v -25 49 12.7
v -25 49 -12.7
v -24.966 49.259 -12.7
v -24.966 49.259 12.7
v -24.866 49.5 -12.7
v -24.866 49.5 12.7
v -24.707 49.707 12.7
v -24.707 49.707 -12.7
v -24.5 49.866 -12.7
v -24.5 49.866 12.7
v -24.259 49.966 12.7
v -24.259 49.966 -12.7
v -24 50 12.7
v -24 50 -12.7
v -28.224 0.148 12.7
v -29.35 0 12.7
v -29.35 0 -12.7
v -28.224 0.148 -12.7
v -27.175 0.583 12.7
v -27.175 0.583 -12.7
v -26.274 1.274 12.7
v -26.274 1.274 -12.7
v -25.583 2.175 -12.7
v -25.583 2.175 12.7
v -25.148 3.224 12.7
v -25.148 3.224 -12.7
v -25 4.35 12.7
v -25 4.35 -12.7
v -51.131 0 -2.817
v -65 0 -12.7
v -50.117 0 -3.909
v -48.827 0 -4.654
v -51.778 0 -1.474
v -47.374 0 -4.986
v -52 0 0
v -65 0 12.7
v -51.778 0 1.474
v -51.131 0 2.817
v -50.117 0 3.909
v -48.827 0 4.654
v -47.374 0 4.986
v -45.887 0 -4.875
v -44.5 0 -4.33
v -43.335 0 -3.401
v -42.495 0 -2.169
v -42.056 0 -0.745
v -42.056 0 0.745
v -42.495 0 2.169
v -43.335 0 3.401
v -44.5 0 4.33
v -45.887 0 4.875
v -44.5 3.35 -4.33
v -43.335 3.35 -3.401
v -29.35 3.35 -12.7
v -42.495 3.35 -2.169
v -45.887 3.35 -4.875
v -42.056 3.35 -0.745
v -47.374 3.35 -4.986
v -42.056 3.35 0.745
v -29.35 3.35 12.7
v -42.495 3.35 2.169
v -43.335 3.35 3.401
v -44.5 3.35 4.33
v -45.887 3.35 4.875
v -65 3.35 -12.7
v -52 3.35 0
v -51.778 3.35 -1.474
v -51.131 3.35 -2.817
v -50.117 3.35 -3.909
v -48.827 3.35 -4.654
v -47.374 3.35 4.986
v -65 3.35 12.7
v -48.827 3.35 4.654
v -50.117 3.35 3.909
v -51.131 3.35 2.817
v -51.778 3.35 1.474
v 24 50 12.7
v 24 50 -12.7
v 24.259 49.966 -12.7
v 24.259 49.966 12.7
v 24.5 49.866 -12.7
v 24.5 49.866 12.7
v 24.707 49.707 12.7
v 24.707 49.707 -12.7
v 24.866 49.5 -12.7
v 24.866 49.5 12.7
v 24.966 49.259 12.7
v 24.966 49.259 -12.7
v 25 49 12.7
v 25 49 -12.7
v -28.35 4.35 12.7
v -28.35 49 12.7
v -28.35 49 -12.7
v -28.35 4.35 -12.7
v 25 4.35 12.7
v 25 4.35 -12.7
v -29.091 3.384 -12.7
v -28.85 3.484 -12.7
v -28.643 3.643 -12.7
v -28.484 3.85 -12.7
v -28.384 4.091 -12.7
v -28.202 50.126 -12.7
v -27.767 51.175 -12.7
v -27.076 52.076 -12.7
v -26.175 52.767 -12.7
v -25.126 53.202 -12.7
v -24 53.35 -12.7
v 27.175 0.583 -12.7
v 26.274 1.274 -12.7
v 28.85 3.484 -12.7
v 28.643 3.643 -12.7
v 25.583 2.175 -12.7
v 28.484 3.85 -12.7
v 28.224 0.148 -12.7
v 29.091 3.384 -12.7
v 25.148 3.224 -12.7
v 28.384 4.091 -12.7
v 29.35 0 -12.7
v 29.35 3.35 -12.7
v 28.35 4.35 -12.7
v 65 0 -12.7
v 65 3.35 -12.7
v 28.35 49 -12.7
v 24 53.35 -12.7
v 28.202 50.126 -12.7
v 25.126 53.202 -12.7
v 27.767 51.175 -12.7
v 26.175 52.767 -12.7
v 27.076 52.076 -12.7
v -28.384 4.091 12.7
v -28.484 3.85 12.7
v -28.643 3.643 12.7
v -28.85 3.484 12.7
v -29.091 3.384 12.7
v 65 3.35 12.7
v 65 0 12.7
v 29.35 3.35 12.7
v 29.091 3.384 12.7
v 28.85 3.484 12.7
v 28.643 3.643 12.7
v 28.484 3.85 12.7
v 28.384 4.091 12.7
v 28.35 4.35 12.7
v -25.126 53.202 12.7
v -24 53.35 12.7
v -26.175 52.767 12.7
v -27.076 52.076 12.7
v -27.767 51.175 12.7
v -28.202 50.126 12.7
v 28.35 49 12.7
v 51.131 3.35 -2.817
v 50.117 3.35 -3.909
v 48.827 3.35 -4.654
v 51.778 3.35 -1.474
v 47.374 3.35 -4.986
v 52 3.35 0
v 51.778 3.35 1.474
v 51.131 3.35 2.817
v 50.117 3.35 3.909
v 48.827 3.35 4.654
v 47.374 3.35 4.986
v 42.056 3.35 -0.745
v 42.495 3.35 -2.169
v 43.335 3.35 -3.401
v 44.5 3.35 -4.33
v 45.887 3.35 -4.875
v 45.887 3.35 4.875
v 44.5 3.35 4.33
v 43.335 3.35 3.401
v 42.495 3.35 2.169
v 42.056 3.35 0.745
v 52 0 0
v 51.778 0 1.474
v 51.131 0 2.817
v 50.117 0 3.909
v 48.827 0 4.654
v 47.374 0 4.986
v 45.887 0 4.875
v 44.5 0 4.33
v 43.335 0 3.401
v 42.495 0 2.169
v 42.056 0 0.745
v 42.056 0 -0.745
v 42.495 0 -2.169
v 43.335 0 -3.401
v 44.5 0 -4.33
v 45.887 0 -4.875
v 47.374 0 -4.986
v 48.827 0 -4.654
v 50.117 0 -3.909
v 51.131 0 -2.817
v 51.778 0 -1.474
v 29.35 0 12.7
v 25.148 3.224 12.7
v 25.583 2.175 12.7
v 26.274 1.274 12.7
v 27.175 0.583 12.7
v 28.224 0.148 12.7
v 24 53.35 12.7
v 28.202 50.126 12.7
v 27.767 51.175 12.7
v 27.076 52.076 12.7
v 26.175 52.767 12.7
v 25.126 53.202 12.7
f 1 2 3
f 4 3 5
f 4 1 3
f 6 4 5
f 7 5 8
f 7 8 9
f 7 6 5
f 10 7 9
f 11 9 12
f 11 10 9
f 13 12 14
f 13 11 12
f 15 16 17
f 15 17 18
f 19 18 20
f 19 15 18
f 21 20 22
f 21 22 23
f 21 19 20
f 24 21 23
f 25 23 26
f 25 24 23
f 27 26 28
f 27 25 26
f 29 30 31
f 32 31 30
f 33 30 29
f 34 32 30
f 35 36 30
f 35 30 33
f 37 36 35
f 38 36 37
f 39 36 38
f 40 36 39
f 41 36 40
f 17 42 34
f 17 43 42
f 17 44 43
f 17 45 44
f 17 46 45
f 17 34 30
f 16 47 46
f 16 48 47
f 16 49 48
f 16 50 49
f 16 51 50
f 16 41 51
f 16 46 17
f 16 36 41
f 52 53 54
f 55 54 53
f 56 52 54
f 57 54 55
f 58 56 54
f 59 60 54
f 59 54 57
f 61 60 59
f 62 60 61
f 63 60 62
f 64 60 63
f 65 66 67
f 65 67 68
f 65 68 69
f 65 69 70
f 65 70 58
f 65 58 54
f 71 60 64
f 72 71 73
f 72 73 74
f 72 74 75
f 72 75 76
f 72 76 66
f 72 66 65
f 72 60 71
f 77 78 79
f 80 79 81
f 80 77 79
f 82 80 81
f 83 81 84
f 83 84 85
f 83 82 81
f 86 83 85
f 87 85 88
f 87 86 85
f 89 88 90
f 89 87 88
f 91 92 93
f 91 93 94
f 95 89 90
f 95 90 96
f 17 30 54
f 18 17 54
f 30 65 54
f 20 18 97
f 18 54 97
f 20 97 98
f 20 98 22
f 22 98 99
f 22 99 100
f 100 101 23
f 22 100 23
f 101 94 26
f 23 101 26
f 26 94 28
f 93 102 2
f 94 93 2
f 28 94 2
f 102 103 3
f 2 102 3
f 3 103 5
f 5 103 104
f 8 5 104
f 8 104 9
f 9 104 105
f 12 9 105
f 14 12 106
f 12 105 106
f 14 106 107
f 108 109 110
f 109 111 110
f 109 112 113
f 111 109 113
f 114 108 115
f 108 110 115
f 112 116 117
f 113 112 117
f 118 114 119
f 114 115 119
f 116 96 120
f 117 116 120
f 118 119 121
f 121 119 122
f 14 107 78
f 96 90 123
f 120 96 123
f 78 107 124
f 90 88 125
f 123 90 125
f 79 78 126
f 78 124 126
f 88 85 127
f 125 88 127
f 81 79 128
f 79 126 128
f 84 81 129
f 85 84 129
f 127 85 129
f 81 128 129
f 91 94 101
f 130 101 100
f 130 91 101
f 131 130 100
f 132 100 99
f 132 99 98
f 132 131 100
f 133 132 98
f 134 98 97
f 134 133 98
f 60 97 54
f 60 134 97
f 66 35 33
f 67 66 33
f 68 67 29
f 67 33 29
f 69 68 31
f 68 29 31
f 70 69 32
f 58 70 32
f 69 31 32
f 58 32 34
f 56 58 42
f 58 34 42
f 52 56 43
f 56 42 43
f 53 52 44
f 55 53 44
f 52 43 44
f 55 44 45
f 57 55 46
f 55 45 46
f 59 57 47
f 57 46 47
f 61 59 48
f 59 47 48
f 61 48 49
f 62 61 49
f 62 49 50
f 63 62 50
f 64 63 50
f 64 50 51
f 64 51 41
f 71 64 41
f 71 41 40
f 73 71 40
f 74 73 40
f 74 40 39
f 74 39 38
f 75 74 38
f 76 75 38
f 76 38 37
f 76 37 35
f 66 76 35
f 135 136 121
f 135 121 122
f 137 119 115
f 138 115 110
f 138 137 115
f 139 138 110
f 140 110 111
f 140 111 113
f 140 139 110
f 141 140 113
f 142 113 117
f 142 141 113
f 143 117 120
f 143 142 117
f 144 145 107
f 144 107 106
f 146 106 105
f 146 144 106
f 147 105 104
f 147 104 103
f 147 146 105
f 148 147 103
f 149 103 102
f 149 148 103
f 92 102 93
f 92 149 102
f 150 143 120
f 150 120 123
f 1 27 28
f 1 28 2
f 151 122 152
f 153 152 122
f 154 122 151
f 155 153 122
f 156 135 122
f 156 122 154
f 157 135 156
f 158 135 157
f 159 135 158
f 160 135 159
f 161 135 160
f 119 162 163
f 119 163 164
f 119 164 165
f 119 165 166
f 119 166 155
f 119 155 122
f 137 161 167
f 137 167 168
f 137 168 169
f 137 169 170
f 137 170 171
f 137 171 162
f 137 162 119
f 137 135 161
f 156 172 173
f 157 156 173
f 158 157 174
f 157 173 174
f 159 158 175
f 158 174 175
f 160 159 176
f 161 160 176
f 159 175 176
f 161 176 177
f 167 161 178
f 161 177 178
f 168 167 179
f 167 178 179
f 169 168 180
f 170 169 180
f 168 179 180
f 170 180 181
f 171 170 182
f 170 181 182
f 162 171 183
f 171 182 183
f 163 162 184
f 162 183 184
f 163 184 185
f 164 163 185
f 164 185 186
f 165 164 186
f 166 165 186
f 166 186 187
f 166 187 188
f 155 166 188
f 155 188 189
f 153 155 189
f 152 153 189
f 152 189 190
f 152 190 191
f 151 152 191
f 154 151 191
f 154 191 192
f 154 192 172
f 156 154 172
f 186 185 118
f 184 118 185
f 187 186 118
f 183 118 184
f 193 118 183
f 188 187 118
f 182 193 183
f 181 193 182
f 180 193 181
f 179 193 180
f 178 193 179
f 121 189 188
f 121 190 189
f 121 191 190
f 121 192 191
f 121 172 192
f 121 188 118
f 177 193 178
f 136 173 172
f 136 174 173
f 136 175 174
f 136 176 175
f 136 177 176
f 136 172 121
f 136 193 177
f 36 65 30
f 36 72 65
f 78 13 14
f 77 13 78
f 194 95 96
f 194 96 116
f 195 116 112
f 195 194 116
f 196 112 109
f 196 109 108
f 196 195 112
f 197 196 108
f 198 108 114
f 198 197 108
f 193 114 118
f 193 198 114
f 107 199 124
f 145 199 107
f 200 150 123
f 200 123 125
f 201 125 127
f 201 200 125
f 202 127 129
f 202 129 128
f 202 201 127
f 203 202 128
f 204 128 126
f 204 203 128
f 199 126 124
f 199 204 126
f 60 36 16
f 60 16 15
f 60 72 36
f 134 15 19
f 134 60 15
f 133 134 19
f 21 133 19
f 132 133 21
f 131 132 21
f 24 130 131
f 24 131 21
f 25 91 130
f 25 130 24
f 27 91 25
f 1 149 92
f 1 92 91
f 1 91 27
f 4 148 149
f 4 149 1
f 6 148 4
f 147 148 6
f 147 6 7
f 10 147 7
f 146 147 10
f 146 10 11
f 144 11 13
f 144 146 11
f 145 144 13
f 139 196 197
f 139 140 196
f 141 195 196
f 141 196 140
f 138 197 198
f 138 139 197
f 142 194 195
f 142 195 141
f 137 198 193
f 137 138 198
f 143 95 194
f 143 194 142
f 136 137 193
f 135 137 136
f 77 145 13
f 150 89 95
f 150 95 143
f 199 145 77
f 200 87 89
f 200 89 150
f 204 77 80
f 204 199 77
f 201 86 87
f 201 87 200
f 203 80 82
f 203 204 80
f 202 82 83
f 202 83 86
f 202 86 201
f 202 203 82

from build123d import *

# Parameters (mm, degrees)
FLANGE_BASE1_DEPTH    = 12.7
ESBO_O3_R             = 5
CORTE_EXTRUS_O1_DEPTH = 10


# Sheet-metal steps are written as plain solids
with BuildPart() as part:
    # Esboço1 → Flange-base1 (new, symmetric)
    with BuildSketch(Plane.XY):
        with BuildLine():
            Line((-65, 0), (-29.35, 0))
            ThreePointArc((-29.35, 0), (-26.274085502, 1.274085502), (-25, 4.35))
            Line((-25, 4.35), (-25, 49))
            ThreePointArc((-25, 49), (-24.707106781, 49.707106781), (-24, 50))
            Line((-24, 50), (24, 50))
            ThreePointArc((24, 50), (24.707106781, 49.707106781), (25, 49))
            Line((25, 49), (25, 4.35))
            ThreePointArc((25, 4.35), (26.274085502, 1.274085502), (29.35, 0))
            Line((29.35, 0), (65, 0))
            Line((65, 0), (65, 3.35))
            Line((65, 3.35), (29.35, 3.35))
            ThreePointArc((29.35, 3.35), (28.642893219, 3.642893219), (28.35, 4.35))
            Line((28.35, 4.35), (28.35, 49))
            ThreePointArc((28.35, 49), (27.075914498, 52.075914498), (24, 53.35))
            Line((24, 53.35), (-24, 53.35))
            ThreePointArc((-24, 53.35), (-27.075914498, 52.075914498), (-28.35, 49))
            Line((-28.35, 49), (-28.35, 4.35))
            ThreePointArc((-28.35, 4.35), (-28.642893219, 3.642893219), (-29.35, 3.35))
            Line((-29.35, 3.35), (-65, 3.35))
            Line((-65, 3.35), (-65, 0))
        make_face()
    extrude(amount=FLANGE_BASE1_DEPTH, both=True)

    # Esboço3 → Corte-extrusão1 (cut)
    with BuildSketch(Plane.XZ):
        with Locations((47, 0)):
            Circle(ESBO_O3_R)
        with Locations(Location((-47, 0, 0), (0, 0, 180))):
            Circle(ESBO_O3_R)
    extrude(amount=-CORTE_EXTRUS_O1_DEPTH, mode=Mode.SUBTRACT)


solid = part.part
